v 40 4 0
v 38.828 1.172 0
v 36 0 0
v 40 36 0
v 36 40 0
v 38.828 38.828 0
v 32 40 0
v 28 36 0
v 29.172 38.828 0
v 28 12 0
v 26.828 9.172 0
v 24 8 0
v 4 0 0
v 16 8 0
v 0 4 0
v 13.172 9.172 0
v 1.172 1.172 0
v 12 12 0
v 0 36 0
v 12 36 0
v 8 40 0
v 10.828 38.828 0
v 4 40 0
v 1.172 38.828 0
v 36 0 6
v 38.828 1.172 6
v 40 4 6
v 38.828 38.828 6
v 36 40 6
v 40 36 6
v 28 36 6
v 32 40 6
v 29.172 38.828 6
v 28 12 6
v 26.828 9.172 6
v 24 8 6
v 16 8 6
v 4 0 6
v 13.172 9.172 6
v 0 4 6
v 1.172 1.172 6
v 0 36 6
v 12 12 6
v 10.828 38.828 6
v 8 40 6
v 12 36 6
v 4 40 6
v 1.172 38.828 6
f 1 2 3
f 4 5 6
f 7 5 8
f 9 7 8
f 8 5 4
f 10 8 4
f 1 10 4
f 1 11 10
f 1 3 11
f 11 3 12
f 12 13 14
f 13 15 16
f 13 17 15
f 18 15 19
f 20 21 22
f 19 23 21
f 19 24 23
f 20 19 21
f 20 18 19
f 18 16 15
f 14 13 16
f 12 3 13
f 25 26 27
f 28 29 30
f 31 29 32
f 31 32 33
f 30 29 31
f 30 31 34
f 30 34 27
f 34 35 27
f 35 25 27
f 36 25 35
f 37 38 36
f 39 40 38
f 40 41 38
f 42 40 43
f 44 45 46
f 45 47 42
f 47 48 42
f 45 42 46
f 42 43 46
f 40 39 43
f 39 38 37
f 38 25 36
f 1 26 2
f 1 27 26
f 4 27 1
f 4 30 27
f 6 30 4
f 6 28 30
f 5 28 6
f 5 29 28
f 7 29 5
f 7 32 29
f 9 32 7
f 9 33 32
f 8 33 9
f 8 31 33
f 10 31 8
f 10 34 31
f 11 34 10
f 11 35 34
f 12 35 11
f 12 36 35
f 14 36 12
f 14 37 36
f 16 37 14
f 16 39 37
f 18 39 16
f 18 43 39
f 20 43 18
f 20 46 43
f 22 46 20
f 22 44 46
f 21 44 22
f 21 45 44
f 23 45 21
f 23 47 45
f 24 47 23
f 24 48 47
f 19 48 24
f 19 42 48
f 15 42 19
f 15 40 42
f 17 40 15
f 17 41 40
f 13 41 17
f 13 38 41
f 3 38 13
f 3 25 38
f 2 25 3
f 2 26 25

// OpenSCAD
$fn = 32;

// ----------------------------------------------------------------------
// Eye lug: clevis, 6 mm thick
// ----------------------------------------------------------------------

// --- parameters (mm) ---
profile_height = 6;       // extrusion height
profile_points = 24;      // points of the closed outline

profile = [[0, 4], [1.172, 1.172], [4, 0], [36, 0], [38.828, 1.172], [40, 4], [40, 36], [38.828, 38.828], [36, 40], [32, 40], [29.172, 38.828], [28, 36], [28, 12], [26.828, 9.172], [24, 8], [16, 8], [13.172, 9.172], [12, 12], [12, 36], [10.828, 38.828], [8, 40], [4, 40], [1.172, 38.828], [0, 36]];  // single closed polygon, 24 points, counter clockwise

// --- the one profile operation ---
linear_extrude(height = profile_height) polygon(points = profile);
